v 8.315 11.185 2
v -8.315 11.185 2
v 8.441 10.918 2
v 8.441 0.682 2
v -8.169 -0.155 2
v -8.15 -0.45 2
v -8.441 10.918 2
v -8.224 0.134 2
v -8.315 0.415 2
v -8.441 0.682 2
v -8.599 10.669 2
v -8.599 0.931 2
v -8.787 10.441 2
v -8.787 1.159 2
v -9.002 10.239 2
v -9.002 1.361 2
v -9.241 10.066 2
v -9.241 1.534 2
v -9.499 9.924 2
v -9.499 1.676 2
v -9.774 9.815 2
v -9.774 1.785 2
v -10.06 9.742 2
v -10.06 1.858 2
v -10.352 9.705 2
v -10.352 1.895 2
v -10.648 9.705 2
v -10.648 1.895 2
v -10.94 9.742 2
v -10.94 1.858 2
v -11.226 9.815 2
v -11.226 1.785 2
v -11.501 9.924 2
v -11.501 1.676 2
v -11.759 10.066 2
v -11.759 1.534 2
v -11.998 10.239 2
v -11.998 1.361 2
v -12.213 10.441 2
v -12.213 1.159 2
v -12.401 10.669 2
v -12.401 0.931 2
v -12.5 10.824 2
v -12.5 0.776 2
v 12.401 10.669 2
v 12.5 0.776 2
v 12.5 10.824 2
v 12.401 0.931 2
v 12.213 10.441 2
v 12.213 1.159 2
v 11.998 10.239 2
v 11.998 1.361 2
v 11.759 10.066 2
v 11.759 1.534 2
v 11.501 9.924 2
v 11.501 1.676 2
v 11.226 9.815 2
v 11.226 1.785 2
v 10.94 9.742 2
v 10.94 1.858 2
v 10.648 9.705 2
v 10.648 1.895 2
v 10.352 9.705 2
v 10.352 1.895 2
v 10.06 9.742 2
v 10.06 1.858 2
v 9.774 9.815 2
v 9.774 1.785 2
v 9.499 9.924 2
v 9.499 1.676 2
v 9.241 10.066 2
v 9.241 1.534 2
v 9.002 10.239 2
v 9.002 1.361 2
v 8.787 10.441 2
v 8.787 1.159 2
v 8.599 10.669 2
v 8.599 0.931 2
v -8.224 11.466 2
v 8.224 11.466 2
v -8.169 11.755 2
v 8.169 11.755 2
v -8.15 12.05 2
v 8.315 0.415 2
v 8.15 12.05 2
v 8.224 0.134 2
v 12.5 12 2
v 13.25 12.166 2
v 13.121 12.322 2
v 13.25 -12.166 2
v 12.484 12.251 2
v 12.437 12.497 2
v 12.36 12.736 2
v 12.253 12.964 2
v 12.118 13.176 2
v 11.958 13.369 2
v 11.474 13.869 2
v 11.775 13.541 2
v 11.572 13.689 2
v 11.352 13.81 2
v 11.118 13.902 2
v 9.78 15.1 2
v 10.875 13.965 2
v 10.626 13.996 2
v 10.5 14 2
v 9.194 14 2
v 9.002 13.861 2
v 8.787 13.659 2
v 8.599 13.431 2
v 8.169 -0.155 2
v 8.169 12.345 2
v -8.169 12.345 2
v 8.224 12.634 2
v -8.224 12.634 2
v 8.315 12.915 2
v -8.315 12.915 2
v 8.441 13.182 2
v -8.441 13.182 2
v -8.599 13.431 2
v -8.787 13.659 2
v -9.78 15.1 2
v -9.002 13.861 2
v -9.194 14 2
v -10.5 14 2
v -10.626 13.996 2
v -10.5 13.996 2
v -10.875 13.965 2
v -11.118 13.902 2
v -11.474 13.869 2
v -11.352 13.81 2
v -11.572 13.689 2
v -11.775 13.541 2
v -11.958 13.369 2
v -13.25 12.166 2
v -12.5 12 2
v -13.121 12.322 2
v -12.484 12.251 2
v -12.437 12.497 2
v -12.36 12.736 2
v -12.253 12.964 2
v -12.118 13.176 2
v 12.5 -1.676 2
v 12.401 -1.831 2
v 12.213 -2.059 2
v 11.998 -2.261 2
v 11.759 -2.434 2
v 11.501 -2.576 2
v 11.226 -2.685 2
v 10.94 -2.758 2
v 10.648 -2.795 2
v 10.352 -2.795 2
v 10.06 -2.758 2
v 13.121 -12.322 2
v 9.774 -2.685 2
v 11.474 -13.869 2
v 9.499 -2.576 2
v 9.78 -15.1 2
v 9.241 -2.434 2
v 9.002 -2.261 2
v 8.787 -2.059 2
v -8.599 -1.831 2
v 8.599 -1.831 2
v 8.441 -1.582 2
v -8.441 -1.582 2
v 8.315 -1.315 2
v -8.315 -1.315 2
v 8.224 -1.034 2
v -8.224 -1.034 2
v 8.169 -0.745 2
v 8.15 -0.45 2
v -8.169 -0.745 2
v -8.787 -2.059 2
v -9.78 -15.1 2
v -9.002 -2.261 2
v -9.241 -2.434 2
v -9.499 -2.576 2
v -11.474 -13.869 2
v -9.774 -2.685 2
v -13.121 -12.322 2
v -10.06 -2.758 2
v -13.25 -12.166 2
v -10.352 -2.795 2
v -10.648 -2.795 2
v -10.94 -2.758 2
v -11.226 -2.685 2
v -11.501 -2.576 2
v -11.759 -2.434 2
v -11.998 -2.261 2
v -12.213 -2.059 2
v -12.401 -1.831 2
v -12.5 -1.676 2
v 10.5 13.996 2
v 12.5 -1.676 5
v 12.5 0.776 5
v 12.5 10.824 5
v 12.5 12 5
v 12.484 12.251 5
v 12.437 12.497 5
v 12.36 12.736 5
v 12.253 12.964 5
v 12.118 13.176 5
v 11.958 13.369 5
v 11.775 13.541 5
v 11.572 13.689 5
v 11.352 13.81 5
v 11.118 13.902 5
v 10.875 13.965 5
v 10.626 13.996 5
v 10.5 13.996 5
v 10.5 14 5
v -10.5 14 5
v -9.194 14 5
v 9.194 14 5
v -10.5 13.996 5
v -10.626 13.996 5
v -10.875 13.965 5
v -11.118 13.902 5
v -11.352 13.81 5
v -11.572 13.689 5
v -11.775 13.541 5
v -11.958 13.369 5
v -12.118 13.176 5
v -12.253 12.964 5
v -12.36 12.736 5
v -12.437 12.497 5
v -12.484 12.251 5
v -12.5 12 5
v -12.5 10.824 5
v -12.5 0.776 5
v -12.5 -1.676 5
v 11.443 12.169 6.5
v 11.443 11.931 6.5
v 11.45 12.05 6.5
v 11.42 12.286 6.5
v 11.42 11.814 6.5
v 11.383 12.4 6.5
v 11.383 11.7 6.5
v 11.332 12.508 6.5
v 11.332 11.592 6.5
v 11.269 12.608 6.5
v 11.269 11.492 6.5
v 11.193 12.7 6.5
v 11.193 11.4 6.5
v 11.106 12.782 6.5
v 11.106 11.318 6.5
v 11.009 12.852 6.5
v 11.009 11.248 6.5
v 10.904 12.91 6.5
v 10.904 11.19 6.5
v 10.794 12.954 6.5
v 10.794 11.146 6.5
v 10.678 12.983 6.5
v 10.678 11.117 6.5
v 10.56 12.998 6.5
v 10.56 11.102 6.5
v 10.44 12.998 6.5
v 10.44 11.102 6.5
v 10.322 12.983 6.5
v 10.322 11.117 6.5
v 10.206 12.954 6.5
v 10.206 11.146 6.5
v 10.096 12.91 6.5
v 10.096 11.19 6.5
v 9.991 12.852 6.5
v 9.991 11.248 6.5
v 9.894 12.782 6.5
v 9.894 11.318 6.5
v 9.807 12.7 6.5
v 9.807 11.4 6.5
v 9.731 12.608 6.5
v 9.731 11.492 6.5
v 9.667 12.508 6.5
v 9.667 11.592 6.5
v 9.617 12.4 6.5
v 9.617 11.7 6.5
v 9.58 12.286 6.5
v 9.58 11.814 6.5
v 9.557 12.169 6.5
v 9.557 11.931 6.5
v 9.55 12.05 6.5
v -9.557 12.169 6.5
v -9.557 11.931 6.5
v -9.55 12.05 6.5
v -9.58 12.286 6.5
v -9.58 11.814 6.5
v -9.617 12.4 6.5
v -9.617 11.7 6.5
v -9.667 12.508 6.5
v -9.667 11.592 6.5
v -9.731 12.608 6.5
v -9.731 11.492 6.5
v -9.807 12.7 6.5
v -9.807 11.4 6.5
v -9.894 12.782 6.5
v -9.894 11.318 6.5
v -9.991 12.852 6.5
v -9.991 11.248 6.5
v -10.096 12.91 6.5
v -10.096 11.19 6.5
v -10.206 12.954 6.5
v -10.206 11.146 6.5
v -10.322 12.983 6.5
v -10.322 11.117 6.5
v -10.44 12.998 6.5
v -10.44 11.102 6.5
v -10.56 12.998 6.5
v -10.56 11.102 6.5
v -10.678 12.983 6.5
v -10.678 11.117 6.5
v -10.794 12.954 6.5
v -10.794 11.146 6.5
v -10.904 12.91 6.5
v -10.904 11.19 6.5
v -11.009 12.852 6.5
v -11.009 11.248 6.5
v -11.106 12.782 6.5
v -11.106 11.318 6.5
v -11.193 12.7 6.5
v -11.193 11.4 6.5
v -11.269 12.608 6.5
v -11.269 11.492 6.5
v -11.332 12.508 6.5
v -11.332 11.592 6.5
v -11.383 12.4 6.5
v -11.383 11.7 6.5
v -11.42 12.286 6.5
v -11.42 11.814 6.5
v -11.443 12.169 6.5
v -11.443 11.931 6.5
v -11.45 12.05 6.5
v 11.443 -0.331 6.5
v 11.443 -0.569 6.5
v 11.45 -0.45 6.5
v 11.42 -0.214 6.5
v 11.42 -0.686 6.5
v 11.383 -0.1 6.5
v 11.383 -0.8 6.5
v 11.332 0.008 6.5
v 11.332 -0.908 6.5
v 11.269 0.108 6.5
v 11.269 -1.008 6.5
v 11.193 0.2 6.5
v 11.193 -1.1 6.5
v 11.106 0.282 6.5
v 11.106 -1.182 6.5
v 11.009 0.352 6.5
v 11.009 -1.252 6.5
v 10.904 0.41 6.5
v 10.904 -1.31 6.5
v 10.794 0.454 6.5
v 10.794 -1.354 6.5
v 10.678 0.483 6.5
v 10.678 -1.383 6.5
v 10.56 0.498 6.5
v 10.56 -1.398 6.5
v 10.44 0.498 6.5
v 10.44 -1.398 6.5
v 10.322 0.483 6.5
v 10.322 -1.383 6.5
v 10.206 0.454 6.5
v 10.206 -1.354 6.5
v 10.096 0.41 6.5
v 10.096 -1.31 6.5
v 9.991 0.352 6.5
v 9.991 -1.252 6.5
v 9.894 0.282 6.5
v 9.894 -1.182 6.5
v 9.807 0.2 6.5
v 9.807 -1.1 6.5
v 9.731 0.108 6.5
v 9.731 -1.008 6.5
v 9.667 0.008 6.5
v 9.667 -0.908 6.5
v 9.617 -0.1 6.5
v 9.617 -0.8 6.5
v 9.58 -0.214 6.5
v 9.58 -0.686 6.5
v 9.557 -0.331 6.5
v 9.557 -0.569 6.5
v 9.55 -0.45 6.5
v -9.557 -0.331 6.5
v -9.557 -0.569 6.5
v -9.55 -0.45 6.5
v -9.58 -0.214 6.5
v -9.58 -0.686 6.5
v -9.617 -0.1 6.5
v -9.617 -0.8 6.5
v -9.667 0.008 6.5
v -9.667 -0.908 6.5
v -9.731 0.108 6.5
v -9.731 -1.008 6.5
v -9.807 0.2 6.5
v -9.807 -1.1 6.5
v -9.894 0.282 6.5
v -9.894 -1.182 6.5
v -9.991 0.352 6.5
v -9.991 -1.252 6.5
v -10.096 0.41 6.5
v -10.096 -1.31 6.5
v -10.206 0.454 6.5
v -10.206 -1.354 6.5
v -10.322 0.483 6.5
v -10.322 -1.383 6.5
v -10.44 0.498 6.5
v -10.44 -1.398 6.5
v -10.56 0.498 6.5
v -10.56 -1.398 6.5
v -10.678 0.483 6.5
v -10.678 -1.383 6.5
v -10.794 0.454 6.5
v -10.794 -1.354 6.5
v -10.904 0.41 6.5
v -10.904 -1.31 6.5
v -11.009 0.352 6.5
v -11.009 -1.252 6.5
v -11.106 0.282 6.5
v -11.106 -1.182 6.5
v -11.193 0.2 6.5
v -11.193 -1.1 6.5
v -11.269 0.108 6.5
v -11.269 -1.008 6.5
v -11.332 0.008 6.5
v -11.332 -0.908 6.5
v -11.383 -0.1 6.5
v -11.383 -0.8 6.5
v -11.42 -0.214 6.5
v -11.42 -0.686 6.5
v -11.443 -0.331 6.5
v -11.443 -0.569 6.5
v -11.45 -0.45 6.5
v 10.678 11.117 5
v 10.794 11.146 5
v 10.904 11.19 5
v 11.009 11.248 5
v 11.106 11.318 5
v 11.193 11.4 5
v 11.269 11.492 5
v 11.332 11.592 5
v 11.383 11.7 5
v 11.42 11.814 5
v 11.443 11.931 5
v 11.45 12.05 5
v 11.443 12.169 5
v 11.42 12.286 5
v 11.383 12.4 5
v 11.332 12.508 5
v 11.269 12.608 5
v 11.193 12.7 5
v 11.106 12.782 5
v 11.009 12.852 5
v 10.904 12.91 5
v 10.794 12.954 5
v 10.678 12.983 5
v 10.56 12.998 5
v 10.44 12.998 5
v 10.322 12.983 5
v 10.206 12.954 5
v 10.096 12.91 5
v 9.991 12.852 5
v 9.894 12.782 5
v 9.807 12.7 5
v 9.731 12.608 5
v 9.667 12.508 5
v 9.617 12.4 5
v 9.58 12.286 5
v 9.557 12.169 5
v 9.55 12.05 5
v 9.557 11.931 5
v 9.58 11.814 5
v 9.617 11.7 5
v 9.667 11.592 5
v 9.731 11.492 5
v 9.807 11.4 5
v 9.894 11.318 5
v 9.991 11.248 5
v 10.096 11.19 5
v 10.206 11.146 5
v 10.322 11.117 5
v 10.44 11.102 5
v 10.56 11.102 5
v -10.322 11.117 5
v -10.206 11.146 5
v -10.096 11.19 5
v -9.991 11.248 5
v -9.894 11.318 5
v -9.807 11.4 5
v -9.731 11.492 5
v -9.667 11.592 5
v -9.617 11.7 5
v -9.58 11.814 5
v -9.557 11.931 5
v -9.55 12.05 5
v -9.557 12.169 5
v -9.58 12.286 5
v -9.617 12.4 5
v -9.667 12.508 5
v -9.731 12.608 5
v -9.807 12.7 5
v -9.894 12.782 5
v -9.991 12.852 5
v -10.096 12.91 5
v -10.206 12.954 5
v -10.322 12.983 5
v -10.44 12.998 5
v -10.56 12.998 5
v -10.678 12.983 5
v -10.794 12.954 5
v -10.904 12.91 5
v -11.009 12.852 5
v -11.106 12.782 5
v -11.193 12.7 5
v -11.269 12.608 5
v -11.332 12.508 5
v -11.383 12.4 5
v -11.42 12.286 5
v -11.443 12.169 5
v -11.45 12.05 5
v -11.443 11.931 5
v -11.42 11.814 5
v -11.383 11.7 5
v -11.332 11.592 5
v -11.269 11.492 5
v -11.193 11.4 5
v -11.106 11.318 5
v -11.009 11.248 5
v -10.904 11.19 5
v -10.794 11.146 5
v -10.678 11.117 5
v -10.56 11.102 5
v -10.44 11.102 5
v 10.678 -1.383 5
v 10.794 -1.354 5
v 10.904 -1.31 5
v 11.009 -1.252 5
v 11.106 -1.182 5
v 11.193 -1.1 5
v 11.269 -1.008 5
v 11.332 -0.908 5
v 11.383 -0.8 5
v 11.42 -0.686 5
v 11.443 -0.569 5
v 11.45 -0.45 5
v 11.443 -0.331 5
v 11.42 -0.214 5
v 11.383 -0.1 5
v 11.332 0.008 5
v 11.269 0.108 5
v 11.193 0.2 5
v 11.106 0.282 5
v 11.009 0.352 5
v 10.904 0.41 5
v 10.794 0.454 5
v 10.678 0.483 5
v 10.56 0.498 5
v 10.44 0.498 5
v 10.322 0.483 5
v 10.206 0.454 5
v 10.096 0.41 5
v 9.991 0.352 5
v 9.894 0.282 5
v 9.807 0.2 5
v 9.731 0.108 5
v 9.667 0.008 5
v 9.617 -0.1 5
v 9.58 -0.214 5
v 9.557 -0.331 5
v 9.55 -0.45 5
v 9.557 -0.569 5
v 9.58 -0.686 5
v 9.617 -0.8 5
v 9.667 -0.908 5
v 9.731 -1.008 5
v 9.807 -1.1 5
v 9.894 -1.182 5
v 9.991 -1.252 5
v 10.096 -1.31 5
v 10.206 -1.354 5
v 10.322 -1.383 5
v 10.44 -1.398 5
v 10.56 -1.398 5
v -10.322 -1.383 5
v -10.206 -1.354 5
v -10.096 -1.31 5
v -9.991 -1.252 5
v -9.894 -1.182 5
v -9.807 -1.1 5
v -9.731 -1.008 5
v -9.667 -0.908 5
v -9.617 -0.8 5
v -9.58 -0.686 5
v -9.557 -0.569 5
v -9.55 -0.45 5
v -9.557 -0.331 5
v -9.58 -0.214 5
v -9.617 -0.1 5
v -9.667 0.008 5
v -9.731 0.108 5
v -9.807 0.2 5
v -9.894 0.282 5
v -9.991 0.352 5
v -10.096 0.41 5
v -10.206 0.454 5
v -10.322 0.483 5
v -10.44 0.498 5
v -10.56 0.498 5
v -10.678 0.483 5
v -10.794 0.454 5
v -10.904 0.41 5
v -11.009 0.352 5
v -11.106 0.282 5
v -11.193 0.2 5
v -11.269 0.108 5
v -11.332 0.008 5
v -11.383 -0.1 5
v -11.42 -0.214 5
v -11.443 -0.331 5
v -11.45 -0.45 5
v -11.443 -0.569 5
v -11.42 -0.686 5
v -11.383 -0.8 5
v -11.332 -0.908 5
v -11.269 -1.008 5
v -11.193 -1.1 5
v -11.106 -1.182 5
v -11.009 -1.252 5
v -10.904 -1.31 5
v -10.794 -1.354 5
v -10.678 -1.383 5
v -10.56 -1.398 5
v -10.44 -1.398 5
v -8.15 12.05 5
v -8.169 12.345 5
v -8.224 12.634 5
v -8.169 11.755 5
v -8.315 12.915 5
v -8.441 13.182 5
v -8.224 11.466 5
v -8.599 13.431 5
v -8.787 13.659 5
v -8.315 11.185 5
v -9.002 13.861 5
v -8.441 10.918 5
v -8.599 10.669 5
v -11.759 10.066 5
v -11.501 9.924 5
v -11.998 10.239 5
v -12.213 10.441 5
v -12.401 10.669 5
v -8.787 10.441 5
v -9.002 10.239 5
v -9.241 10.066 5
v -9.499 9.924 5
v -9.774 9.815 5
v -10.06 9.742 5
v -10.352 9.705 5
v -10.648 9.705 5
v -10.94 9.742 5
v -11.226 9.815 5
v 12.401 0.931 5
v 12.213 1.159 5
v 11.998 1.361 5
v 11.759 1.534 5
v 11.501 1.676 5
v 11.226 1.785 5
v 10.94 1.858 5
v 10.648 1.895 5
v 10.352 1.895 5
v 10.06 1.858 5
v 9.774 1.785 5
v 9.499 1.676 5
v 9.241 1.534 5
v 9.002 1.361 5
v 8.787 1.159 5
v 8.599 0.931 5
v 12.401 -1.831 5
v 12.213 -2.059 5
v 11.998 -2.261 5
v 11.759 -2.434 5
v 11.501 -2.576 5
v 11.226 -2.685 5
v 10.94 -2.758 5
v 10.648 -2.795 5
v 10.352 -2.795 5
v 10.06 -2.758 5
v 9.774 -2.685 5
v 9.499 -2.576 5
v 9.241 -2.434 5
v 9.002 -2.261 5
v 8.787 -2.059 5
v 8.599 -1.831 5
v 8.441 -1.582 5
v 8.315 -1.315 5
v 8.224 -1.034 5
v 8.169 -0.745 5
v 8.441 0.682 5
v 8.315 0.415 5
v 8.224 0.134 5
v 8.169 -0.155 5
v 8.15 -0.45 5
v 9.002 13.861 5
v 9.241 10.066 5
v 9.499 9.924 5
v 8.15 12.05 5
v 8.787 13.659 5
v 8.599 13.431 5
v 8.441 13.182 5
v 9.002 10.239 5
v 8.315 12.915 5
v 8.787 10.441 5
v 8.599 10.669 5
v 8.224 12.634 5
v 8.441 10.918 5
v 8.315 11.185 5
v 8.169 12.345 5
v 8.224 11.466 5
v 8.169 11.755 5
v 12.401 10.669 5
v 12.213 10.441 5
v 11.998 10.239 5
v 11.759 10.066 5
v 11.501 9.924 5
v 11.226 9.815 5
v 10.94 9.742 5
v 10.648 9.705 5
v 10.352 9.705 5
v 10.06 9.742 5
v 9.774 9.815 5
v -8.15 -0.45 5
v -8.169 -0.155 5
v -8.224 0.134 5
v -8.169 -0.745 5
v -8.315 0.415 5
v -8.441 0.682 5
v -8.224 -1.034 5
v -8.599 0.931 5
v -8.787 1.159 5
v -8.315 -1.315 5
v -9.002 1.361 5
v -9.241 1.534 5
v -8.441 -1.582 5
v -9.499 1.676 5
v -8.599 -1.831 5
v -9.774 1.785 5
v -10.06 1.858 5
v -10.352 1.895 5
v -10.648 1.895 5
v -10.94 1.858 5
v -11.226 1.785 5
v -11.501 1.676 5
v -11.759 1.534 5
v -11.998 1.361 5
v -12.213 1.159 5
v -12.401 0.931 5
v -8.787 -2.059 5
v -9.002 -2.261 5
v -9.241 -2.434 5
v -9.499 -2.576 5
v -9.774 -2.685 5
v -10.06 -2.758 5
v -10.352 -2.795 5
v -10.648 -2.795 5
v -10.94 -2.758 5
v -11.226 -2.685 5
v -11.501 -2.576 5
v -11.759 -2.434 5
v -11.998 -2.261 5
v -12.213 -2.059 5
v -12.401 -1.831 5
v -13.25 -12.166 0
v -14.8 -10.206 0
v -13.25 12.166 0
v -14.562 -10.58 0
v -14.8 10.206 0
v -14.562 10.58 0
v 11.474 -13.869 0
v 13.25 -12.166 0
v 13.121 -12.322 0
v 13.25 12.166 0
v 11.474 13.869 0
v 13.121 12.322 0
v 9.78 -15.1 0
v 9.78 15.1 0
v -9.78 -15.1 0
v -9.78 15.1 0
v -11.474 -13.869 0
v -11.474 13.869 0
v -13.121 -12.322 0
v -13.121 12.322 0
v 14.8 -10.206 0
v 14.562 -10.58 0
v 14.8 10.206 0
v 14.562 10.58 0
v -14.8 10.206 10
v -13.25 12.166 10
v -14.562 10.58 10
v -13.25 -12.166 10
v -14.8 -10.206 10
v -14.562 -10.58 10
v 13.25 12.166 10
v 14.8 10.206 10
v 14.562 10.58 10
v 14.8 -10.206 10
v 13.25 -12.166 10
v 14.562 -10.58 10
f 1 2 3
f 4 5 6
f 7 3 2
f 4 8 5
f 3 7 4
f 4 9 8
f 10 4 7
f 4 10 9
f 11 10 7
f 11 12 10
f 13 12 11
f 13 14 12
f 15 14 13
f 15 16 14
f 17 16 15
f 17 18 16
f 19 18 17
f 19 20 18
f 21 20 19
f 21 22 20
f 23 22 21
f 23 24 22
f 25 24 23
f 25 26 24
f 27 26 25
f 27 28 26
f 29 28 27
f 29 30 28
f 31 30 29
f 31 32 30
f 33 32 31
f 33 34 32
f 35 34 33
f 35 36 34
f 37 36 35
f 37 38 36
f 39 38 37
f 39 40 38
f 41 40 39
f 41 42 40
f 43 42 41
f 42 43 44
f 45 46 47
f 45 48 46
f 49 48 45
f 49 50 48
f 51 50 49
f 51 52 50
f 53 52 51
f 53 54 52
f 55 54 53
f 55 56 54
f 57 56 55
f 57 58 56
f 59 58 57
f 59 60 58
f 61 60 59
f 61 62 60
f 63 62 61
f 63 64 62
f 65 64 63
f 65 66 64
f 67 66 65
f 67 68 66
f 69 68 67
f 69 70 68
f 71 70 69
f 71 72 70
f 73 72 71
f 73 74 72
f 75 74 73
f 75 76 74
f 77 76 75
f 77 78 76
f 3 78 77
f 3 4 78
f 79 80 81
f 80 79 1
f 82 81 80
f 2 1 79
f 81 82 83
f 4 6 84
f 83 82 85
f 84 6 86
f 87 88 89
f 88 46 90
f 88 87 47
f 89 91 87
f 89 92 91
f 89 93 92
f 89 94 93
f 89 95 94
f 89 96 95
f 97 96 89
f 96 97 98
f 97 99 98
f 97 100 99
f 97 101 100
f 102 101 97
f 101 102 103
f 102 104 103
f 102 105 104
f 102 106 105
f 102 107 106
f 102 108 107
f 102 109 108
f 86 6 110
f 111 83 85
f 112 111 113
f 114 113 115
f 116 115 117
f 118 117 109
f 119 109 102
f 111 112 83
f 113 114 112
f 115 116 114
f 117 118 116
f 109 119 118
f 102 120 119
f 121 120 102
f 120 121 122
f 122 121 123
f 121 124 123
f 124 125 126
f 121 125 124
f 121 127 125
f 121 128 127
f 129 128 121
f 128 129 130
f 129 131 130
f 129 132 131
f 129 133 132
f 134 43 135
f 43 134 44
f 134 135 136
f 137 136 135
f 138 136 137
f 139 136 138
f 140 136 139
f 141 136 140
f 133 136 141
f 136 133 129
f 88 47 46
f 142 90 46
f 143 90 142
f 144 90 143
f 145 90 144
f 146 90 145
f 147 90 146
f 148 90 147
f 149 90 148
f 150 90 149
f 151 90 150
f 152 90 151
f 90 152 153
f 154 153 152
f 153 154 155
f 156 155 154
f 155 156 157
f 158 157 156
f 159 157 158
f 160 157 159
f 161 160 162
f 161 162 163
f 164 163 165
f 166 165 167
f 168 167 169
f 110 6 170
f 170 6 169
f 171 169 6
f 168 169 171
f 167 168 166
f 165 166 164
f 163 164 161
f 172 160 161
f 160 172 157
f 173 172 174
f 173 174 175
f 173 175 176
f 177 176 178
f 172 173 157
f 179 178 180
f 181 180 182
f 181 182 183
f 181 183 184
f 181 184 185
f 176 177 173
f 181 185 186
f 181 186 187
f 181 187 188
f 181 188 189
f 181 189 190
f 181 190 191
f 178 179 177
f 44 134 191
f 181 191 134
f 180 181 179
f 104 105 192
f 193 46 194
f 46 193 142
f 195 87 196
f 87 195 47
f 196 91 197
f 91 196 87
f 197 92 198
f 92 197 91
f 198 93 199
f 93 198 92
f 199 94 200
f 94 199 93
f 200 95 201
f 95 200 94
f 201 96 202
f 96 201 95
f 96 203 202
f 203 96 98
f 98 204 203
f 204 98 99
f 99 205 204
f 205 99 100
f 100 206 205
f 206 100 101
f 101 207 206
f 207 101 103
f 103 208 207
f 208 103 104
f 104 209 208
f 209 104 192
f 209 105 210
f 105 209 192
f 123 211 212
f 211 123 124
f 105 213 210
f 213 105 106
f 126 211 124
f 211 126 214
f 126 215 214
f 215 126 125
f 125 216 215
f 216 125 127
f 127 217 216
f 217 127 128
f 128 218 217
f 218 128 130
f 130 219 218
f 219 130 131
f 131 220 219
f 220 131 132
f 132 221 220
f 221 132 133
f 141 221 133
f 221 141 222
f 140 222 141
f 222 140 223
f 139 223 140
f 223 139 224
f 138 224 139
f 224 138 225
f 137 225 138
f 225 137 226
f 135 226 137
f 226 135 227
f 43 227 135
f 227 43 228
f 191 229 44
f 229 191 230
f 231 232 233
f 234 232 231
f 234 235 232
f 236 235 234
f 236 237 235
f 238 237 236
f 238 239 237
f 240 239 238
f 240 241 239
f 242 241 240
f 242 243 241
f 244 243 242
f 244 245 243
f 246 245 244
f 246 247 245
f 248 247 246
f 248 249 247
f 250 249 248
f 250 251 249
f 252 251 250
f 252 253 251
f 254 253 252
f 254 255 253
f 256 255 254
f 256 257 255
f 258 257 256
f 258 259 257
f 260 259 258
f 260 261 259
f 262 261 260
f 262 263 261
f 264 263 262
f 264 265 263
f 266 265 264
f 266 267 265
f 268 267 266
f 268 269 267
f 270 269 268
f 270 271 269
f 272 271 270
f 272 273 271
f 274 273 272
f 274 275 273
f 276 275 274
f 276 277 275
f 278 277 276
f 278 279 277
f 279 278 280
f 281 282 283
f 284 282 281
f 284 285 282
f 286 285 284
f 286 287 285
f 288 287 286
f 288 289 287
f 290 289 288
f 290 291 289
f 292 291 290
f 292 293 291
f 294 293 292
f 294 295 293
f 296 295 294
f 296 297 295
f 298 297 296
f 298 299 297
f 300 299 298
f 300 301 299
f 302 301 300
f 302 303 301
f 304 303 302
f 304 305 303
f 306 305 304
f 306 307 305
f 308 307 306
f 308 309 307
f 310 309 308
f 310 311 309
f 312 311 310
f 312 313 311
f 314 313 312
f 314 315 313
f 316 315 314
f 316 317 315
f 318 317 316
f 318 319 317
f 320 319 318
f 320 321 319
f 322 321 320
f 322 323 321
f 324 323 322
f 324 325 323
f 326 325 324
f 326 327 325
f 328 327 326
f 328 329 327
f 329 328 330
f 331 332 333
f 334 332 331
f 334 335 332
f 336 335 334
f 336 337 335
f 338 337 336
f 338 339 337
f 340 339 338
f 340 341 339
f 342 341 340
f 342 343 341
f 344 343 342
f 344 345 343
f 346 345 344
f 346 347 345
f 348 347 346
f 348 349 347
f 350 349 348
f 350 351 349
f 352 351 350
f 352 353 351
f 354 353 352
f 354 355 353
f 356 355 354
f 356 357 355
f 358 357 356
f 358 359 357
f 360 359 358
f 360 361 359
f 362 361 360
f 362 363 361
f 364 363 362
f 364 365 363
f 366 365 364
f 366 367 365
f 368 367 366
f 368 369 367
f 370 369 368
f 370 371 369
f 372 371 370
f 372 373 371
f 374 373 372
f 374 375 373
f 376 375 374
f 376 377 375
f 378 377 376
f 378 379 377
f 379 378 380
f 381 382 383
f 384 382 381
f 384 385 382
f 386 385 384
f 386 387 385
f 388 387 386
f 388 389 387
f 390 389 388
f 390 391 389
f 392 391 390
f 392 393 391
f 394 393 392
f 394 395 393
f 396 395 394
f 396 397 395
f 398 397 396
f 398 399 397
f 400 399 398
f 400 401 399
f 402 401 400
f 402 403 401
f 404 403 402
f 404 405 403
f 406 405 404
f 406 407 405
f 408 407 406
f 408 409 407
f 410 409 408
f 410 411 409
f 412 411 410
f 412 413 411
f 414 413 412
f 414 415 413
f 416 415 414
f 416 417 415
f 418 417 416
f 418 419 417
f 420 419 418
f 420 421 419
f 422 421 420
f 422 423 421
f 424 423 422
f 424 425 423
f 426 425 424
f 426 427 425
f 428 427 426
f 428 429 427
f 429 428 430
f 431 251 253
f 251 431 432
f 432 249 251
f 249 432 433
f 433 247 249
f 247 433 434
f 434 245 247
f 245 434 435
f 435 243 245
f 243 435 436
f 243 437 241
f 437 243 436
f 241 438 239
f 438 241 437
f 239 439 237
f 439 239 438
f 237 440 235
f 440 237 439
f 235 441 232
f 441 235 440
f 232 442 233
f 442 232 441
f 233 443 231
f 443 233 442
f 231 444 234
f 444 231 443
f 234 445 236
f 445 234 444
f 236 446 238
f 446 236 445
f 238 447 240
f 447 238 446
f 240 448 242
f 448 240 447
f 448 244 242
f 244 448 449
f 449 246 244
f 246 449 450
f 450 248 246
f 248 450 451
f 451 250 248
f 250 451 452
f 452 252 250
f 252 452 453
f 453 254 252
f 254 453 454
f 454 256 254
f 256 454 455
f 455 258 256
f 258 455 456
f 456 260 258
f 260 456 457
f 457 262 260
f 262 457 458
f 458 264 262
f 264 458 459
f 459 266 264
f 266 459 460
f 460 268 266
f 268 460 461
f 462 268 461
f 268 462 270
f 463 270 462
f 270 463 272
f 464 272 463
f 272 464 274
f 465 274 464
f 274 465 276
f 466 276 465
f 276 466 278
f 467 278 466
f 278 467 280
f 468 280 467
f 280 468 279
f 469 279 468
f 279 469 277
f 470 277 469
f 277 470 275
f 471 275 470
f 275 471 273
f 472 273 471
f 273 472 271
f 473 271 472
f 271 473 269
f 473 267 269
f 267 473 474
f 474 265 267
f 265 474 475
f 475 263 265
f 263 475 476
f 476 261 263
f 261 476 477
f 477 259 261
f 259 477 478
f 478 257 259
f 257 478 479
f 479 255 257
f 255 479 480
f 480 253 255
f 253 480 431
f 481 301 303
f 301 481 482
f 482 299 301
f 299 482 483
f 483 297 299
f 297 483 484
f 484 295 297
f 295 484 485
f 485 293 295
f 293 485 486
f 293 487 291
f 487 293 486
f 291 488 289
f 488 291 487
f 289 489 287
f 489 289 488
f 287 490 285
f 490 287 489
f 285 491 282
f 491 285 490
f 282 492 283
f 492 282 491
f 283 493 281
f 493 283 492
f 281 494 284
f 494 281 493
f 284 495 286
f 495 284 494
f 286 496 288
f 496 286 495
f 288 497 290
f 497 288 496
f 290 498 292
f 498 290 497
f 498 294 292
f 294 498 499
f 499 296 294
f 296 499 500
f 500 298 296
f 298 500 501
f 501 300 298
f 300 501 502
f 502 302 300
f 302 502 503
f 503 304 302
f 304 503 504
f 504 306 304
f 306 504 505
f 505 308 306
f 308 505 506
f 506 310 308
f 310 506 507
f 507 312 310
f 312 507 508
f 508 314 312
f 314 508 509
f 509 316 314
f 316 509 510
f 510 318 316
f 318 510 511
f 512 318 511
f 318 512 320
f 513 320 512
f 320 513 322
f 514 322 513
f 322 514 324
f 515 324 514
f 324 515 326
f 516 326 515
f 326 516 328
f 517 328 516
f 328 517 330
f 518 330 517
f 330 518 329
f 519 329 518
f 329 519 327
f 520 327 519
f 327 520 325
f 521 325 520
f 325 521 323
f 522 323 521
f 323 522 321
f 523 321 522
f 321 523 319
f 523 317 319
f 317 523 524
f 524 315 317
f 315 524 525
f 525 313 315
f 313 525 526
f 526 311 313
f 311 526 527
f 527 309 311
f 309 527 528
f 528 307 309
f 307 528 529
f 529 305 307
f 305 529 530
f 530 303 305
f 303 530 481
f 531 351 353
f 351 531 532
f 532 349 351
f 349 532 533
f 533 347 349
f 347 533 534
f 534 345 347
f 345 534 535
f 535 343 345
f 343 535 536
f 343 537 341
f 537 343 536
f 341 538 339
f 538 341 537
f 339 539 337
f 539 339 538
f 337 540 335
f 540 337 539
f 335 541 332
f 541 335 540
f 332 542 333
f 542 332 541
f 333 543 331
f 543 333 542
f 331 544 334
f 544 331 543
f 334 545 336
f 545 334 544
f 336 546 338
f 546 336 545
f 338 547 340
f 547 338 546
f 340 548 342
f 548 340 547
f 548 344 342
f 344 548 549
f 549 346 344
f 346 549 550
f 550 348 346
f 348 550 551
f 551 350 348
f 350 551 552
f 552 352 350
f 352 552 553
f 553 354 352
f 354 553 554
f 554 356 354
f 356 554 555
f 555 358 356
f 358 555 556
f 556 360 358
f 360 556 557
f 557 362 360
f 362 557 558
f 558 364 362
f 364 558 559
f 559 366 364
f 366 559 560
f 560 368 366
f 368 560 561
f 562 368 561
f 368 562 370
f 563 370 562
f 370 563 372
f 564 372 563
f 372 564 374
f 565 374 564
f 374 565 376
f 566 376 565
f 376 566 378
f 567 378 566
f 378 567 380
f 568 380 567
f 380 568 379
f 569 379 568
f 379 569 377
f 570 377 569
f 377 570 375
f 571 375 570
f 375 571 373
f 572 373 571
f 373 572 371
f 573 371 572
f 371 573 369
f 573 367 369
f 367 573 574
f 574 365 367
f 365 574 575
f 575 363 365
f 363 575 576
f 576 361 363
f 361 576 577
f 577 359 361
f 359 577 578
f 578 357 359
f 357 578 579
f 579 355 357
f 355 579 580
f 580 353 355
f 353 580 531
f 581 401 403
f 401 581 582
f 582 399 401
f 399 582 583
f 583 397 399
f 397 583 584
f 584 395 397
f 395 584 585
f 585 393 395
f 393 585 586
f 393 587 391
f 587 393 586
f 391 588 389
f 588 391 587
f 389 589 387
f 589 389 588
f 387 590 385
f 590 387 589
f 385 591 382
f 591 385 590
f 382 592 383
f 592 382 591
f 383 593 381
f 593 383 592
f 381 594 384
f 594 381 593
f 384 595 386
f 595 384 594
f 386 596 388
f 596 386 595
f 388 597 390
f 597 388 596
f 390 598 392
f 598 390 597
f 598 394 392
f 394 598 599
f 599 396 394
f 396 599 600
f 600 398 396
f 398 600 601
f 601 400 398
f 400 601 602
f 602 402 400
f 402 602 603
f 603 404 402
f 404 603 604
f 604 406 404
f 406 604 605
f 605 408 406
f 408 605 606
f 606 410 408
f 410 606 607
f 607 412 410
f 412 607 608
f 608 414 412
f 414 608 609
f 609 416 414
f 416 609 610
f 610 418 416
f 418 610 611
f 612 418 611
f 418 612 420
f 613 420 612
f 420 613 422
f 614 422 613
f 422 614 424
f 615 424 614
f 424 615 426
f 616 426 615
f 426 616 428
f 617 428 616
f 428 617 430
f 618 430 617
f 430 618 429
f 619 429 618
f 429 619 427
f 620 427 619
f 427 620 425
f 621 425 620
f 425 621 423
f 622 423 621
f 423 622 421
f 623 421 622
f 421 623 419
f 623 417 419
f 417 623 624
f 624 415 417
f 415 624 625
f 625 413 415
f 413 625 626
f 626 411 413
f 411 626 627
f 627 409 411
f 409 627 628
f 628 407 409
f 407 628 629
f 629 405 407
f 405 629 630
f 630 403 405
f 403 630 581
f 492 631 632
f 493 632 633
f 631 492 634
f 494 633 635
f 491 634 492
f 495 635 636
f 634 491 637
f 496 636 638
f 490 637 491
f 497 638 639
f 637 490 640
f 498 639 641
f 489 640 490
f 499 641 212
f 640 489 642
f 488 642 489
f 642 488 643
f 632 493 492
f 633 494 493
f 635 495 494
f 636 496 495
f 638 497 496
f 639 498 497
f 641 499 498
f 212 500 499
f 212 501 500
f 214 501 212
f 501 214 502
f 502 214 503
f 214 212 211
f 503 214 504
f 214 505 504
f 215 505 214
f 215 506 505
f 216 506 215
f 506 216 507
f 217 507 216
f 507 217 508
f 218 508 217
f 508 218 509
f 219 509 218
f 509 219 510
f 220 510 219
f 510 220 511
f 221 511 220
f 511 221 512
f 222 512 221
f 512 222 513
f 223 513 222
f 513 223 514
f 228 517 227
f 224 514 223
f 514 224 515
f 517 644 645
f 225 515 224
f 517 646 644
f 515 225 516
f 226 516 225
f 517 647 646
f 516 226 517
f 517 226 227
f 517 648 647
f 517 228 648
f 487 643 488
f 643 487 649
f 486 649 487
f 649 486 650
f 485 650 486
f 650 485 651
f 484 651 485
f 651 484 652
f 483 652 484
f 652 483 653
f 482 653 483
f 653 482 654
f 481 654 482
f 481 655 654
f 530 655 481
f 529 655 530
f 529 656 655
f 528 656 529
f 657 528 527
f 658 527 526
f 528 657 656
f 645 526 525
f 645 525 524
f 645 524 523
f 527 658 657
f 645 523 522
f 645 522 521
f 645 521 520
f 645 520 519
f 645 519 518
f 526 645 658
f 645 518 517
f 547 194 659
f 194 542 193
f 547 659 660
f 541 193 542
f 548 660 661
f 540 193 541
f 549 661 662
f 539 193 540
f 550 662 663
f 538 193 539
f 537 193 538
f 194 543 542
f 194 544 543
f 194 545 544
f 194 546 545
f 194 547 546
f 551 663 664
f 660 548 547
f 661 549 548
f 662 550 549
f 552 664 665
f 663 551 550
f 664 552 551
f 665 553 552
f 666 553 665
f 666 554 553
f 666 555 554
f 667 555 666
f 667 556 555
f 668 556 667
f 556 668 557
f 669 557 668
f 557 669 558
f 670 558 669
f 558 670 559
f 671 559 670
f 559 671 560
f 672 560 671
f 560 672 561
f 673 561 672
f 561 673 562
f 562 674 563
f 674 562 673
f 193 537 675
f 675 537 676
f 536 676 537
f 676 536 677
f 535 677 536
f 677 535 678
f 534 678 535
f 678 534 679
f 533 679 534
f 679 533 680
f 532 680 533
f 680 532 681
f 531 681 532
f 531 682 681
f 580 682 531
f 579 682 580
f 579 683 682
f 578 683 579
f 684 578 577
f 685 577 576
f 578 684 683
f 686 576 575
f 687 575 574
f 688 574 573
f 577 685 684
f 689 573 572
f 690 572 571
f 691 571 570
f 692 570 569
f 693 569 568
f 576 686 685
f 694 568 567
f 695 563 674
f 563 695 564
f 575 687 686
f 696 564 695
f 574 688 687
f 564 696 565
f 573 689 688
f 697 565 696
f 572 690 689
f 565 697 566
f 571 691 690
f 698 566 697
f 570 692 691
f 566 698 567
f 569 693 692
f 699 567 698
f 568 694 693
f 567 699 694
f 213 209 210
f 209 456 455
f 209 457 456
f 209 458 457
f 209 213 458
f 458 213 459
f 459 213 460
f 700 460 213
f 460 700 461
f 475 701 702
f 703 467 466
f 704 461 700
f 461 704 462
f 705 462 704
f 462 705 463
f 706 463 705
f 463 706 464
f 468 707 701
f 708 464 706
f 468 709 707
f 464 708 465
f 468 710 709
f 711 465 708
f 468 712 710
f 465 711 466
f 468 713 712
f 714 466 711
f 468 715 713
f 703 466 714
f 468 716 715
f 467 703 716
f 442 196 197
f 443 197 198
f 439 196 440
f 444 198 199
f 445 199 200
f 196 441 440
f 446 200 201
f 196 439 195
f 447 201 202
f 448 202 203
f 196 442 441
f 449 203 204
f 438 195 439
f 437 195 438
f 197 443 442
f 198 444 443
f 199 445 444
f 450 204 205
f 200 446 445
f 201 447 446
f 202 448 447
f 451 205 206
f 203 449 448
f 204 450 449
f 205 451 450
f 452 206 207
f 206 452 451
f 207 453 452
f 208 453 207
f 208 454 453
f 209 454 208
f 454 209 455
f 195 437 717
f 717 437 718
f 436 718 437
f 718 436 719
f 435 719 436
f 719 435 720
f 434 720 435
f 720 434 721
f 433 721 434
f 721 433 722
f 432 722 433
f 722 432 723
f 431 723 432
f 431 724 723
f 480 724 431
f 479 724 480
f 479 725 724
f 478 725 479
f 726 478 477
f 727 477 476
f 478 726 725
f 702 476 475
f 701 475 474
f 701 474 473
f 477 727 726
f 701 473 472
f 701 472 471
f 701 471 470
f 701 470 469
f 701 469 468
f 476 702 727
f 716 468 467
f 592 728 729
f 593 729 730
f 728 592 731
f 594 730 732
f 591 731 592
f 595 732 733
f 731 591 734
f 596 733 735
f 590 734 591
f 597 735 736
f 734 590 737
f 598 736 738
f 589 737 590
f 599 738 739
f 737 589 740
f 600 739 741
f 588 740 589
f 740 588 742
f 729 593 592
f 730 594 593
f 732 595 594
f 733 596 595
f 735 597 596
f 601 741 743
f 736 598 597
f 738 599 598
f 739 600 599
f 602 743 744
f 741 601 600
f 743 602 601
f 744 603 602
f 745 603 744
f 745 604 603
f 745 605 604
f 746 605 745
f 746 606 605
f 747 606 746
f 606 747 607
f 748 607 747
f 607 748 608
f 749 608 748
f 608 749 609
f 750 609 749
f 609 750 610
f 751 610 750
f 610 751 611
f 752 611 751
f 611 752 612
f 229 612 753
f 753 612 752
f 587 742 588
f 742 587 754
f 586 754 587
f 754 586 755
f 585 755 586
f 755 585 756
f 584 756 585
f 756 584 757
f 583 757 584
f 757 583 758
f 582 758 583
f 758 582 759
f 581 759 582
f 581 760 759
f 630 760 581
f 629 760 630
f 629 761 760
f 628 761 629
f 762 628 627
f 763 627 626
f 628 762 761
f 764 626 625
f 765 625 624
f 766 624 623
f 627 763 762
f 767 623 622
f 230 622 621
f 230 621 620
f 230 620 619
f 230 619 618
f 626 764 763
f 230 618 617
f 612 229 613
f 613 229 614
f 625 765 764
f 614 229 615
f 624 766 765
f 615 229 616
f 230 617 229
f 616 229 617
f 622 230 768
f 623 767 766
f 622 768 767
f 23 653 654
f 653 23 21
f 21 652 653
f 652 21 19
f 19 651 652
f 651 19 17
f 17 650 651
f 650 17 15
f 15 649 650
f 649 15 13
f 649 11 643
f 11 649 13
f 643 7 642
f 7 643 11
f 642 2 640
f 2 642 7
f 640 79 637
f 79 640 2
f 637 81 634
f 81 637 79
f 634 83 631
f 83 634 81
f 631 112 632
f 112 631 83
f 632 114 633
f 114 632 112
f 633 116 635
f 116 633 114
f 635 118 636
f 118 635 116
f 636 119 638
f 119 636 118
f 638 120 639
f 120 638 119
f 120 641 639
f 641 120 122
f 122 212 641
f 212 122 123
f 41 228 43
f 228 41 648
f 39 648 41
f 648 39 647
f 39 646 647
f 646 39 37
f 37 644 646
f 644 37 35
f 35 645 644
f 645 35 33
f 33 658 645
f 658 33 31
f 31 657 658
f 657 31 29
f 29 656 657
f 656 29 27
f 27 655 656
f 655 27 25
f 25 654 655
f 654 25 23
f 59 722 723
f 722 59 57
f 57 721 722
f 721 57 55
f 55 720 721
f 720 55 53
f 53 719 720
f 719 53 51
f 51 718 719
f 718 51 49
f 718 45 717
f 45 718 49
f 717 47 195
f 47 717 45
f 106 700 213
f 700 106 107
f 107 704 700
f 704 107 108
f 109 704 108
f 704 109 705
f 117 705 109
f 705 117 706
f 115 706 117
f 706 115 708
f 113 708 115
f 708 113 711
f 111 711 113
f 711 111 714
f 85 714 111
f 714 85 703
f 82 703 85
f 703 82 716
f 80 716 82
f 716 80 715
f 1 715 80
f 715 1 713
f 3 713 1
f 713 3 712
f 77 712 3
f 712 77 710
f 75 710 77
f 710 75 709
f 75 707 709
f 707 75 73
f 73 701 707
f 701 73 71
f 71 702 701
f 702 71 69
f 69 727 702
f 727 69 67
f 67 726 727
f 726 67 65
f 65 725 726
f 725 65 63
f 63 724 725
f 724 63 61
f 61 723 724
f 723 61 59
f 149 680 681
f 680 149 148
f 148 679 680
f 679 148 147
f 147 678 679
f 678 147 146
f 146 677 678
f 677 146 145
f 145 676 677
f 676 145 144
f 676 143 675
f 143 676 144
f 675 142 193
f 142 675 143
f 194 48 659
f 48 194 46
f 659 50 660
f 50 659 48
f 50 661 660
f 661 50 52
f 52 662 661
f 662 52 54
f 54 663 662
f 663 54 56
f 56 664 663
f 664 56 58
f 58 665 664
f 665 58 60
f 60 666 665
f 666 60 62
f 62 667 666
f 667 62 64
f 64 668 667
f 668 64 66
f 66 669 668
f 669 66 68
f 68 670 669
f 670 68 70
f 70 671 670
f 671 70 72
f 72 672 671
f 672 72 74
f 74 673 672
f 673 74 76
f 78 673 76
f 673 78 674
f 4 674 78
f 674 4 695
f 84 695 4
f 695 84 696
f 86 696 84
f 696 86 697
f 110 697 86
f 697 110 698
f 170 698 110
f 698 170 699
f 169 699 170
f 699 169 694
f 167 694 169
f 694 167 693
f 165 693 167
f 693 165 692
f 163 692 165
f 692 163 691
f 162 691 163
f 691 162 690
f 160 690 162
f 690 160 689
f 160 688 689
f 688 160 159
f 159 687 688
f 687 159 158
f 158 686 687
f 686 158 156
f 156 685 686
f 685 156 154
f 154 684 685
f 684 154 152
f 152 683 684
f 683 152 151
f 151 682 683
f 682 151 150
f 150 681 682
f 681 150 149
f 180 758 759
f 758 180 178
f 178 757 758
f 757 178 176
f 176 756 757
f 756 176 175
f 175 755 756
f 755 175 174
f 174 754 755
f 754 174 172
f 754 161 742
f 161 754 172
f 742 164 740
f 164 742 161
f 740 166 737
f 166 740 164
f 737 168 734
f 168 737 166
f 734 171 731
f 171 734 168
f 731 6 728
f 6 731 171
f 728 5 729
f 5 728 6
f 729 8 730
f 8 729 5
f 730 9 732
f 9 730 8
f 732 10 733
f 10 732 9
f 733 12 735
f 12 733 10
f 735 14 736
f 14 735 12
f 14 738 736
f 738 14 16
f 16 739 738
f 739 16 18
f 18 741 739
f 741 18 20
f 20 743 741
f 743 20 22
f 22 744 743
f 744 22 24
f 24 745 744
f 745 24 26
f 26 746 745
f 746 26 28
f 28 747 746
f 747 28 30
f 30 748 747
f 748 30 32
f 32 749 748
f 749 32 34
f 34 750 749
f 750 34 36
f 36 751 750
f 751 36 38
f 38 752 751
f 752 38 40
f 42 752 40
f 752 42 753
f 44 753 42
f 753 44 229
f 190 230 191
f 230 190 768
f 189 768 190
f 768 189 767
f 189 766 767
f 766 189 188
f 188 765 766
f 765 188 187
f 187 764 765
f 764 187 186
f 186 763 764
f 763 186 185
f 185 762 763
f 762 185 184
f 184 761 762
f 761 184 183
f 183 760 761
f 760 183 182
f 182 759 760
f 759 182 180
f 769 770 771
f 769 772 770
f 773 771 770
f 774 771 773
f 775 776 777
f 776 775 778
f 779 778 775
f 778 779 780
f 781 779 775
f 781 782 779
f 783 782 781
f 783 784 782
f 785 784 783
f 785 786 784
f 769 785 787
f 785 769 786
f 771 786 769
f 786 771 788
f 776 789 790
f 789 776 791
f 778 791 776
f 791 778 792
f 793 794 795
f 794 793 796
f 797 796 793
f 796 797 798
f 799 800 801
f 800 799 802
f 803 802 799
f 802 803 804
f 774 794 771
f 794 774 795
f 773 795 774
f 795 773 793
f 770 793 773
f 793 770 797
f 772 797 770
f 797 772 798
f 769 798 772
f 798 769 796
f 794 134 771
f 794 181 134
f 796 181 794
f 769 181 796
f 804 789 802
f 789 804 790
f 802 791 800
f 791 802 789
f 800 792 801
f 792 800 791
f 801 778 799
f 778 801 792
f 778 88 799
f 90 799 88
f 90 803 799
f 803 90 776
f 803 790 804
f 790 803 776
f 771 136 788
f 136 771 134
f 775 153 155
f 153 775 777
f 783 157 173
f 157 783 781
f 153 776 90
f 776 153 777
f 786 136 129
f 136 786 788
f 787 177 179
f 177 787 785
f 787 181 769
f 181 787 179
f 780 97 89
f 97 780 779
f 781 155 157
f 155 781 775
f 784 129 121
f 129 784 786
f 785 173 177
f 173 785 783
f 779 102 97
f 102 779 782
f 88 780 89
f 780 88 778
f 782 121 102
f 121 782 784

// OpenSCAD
/*
* An adapter between the Adafruit Pan/Tilt gimbal and the rapsberry pi camera.
*/

module rounded_quadrant(size, radius){
  difference() {
    square(size);
    translate(size - [radius, radius]) {
      difference(){
        square([radius+.1,radius+.1]);
        circle(radius, $fn=50);
      }
    }
  }
}

module four_sym(){
  for (i = [0:4]) {
    mirror([i%2, 0, 0]) mirror([0, floor(i/2), 0]) children();
  }
}

module rounded_square(size, radius) {
  four_sym() rounded_quadrant(size/2, radius);
}

module camera_mount() {  
  linear_extrude(1) {
    rounded_square([25,24], 2);
  }
  
  linear_extrude(5.5) {
    translate([0,3.8]) {
      four_sym(){
        translate([10.5, 6.25]) {
          circle(.95, $fn=50);
        }
      }
    }
  }
  
  linear_extrude(4) {
    intersection(){
      translate([0,3.8]) {
        four_sym(){
          translate([10.5, 6.25]) {
            circle(4.7/2, $fn=50);
          }
        }
      }
      rounded_square([25,24], 2);
    }
  }
}

module base_perim() {
  intersection() {
    square([29.6,30.2], true);
    circle(18, $fn=50);
  }
}

translate([0,2,1]) {
  camera_mount();
}

linear_extrude(10) {
  difference() {
    base_perim();
		// TODO(namiller): Consider replacing 26.5 with 25.
    square([26.5,30.2], true);
  }
}

linear_extrude(2) {
  base_perim();
}
